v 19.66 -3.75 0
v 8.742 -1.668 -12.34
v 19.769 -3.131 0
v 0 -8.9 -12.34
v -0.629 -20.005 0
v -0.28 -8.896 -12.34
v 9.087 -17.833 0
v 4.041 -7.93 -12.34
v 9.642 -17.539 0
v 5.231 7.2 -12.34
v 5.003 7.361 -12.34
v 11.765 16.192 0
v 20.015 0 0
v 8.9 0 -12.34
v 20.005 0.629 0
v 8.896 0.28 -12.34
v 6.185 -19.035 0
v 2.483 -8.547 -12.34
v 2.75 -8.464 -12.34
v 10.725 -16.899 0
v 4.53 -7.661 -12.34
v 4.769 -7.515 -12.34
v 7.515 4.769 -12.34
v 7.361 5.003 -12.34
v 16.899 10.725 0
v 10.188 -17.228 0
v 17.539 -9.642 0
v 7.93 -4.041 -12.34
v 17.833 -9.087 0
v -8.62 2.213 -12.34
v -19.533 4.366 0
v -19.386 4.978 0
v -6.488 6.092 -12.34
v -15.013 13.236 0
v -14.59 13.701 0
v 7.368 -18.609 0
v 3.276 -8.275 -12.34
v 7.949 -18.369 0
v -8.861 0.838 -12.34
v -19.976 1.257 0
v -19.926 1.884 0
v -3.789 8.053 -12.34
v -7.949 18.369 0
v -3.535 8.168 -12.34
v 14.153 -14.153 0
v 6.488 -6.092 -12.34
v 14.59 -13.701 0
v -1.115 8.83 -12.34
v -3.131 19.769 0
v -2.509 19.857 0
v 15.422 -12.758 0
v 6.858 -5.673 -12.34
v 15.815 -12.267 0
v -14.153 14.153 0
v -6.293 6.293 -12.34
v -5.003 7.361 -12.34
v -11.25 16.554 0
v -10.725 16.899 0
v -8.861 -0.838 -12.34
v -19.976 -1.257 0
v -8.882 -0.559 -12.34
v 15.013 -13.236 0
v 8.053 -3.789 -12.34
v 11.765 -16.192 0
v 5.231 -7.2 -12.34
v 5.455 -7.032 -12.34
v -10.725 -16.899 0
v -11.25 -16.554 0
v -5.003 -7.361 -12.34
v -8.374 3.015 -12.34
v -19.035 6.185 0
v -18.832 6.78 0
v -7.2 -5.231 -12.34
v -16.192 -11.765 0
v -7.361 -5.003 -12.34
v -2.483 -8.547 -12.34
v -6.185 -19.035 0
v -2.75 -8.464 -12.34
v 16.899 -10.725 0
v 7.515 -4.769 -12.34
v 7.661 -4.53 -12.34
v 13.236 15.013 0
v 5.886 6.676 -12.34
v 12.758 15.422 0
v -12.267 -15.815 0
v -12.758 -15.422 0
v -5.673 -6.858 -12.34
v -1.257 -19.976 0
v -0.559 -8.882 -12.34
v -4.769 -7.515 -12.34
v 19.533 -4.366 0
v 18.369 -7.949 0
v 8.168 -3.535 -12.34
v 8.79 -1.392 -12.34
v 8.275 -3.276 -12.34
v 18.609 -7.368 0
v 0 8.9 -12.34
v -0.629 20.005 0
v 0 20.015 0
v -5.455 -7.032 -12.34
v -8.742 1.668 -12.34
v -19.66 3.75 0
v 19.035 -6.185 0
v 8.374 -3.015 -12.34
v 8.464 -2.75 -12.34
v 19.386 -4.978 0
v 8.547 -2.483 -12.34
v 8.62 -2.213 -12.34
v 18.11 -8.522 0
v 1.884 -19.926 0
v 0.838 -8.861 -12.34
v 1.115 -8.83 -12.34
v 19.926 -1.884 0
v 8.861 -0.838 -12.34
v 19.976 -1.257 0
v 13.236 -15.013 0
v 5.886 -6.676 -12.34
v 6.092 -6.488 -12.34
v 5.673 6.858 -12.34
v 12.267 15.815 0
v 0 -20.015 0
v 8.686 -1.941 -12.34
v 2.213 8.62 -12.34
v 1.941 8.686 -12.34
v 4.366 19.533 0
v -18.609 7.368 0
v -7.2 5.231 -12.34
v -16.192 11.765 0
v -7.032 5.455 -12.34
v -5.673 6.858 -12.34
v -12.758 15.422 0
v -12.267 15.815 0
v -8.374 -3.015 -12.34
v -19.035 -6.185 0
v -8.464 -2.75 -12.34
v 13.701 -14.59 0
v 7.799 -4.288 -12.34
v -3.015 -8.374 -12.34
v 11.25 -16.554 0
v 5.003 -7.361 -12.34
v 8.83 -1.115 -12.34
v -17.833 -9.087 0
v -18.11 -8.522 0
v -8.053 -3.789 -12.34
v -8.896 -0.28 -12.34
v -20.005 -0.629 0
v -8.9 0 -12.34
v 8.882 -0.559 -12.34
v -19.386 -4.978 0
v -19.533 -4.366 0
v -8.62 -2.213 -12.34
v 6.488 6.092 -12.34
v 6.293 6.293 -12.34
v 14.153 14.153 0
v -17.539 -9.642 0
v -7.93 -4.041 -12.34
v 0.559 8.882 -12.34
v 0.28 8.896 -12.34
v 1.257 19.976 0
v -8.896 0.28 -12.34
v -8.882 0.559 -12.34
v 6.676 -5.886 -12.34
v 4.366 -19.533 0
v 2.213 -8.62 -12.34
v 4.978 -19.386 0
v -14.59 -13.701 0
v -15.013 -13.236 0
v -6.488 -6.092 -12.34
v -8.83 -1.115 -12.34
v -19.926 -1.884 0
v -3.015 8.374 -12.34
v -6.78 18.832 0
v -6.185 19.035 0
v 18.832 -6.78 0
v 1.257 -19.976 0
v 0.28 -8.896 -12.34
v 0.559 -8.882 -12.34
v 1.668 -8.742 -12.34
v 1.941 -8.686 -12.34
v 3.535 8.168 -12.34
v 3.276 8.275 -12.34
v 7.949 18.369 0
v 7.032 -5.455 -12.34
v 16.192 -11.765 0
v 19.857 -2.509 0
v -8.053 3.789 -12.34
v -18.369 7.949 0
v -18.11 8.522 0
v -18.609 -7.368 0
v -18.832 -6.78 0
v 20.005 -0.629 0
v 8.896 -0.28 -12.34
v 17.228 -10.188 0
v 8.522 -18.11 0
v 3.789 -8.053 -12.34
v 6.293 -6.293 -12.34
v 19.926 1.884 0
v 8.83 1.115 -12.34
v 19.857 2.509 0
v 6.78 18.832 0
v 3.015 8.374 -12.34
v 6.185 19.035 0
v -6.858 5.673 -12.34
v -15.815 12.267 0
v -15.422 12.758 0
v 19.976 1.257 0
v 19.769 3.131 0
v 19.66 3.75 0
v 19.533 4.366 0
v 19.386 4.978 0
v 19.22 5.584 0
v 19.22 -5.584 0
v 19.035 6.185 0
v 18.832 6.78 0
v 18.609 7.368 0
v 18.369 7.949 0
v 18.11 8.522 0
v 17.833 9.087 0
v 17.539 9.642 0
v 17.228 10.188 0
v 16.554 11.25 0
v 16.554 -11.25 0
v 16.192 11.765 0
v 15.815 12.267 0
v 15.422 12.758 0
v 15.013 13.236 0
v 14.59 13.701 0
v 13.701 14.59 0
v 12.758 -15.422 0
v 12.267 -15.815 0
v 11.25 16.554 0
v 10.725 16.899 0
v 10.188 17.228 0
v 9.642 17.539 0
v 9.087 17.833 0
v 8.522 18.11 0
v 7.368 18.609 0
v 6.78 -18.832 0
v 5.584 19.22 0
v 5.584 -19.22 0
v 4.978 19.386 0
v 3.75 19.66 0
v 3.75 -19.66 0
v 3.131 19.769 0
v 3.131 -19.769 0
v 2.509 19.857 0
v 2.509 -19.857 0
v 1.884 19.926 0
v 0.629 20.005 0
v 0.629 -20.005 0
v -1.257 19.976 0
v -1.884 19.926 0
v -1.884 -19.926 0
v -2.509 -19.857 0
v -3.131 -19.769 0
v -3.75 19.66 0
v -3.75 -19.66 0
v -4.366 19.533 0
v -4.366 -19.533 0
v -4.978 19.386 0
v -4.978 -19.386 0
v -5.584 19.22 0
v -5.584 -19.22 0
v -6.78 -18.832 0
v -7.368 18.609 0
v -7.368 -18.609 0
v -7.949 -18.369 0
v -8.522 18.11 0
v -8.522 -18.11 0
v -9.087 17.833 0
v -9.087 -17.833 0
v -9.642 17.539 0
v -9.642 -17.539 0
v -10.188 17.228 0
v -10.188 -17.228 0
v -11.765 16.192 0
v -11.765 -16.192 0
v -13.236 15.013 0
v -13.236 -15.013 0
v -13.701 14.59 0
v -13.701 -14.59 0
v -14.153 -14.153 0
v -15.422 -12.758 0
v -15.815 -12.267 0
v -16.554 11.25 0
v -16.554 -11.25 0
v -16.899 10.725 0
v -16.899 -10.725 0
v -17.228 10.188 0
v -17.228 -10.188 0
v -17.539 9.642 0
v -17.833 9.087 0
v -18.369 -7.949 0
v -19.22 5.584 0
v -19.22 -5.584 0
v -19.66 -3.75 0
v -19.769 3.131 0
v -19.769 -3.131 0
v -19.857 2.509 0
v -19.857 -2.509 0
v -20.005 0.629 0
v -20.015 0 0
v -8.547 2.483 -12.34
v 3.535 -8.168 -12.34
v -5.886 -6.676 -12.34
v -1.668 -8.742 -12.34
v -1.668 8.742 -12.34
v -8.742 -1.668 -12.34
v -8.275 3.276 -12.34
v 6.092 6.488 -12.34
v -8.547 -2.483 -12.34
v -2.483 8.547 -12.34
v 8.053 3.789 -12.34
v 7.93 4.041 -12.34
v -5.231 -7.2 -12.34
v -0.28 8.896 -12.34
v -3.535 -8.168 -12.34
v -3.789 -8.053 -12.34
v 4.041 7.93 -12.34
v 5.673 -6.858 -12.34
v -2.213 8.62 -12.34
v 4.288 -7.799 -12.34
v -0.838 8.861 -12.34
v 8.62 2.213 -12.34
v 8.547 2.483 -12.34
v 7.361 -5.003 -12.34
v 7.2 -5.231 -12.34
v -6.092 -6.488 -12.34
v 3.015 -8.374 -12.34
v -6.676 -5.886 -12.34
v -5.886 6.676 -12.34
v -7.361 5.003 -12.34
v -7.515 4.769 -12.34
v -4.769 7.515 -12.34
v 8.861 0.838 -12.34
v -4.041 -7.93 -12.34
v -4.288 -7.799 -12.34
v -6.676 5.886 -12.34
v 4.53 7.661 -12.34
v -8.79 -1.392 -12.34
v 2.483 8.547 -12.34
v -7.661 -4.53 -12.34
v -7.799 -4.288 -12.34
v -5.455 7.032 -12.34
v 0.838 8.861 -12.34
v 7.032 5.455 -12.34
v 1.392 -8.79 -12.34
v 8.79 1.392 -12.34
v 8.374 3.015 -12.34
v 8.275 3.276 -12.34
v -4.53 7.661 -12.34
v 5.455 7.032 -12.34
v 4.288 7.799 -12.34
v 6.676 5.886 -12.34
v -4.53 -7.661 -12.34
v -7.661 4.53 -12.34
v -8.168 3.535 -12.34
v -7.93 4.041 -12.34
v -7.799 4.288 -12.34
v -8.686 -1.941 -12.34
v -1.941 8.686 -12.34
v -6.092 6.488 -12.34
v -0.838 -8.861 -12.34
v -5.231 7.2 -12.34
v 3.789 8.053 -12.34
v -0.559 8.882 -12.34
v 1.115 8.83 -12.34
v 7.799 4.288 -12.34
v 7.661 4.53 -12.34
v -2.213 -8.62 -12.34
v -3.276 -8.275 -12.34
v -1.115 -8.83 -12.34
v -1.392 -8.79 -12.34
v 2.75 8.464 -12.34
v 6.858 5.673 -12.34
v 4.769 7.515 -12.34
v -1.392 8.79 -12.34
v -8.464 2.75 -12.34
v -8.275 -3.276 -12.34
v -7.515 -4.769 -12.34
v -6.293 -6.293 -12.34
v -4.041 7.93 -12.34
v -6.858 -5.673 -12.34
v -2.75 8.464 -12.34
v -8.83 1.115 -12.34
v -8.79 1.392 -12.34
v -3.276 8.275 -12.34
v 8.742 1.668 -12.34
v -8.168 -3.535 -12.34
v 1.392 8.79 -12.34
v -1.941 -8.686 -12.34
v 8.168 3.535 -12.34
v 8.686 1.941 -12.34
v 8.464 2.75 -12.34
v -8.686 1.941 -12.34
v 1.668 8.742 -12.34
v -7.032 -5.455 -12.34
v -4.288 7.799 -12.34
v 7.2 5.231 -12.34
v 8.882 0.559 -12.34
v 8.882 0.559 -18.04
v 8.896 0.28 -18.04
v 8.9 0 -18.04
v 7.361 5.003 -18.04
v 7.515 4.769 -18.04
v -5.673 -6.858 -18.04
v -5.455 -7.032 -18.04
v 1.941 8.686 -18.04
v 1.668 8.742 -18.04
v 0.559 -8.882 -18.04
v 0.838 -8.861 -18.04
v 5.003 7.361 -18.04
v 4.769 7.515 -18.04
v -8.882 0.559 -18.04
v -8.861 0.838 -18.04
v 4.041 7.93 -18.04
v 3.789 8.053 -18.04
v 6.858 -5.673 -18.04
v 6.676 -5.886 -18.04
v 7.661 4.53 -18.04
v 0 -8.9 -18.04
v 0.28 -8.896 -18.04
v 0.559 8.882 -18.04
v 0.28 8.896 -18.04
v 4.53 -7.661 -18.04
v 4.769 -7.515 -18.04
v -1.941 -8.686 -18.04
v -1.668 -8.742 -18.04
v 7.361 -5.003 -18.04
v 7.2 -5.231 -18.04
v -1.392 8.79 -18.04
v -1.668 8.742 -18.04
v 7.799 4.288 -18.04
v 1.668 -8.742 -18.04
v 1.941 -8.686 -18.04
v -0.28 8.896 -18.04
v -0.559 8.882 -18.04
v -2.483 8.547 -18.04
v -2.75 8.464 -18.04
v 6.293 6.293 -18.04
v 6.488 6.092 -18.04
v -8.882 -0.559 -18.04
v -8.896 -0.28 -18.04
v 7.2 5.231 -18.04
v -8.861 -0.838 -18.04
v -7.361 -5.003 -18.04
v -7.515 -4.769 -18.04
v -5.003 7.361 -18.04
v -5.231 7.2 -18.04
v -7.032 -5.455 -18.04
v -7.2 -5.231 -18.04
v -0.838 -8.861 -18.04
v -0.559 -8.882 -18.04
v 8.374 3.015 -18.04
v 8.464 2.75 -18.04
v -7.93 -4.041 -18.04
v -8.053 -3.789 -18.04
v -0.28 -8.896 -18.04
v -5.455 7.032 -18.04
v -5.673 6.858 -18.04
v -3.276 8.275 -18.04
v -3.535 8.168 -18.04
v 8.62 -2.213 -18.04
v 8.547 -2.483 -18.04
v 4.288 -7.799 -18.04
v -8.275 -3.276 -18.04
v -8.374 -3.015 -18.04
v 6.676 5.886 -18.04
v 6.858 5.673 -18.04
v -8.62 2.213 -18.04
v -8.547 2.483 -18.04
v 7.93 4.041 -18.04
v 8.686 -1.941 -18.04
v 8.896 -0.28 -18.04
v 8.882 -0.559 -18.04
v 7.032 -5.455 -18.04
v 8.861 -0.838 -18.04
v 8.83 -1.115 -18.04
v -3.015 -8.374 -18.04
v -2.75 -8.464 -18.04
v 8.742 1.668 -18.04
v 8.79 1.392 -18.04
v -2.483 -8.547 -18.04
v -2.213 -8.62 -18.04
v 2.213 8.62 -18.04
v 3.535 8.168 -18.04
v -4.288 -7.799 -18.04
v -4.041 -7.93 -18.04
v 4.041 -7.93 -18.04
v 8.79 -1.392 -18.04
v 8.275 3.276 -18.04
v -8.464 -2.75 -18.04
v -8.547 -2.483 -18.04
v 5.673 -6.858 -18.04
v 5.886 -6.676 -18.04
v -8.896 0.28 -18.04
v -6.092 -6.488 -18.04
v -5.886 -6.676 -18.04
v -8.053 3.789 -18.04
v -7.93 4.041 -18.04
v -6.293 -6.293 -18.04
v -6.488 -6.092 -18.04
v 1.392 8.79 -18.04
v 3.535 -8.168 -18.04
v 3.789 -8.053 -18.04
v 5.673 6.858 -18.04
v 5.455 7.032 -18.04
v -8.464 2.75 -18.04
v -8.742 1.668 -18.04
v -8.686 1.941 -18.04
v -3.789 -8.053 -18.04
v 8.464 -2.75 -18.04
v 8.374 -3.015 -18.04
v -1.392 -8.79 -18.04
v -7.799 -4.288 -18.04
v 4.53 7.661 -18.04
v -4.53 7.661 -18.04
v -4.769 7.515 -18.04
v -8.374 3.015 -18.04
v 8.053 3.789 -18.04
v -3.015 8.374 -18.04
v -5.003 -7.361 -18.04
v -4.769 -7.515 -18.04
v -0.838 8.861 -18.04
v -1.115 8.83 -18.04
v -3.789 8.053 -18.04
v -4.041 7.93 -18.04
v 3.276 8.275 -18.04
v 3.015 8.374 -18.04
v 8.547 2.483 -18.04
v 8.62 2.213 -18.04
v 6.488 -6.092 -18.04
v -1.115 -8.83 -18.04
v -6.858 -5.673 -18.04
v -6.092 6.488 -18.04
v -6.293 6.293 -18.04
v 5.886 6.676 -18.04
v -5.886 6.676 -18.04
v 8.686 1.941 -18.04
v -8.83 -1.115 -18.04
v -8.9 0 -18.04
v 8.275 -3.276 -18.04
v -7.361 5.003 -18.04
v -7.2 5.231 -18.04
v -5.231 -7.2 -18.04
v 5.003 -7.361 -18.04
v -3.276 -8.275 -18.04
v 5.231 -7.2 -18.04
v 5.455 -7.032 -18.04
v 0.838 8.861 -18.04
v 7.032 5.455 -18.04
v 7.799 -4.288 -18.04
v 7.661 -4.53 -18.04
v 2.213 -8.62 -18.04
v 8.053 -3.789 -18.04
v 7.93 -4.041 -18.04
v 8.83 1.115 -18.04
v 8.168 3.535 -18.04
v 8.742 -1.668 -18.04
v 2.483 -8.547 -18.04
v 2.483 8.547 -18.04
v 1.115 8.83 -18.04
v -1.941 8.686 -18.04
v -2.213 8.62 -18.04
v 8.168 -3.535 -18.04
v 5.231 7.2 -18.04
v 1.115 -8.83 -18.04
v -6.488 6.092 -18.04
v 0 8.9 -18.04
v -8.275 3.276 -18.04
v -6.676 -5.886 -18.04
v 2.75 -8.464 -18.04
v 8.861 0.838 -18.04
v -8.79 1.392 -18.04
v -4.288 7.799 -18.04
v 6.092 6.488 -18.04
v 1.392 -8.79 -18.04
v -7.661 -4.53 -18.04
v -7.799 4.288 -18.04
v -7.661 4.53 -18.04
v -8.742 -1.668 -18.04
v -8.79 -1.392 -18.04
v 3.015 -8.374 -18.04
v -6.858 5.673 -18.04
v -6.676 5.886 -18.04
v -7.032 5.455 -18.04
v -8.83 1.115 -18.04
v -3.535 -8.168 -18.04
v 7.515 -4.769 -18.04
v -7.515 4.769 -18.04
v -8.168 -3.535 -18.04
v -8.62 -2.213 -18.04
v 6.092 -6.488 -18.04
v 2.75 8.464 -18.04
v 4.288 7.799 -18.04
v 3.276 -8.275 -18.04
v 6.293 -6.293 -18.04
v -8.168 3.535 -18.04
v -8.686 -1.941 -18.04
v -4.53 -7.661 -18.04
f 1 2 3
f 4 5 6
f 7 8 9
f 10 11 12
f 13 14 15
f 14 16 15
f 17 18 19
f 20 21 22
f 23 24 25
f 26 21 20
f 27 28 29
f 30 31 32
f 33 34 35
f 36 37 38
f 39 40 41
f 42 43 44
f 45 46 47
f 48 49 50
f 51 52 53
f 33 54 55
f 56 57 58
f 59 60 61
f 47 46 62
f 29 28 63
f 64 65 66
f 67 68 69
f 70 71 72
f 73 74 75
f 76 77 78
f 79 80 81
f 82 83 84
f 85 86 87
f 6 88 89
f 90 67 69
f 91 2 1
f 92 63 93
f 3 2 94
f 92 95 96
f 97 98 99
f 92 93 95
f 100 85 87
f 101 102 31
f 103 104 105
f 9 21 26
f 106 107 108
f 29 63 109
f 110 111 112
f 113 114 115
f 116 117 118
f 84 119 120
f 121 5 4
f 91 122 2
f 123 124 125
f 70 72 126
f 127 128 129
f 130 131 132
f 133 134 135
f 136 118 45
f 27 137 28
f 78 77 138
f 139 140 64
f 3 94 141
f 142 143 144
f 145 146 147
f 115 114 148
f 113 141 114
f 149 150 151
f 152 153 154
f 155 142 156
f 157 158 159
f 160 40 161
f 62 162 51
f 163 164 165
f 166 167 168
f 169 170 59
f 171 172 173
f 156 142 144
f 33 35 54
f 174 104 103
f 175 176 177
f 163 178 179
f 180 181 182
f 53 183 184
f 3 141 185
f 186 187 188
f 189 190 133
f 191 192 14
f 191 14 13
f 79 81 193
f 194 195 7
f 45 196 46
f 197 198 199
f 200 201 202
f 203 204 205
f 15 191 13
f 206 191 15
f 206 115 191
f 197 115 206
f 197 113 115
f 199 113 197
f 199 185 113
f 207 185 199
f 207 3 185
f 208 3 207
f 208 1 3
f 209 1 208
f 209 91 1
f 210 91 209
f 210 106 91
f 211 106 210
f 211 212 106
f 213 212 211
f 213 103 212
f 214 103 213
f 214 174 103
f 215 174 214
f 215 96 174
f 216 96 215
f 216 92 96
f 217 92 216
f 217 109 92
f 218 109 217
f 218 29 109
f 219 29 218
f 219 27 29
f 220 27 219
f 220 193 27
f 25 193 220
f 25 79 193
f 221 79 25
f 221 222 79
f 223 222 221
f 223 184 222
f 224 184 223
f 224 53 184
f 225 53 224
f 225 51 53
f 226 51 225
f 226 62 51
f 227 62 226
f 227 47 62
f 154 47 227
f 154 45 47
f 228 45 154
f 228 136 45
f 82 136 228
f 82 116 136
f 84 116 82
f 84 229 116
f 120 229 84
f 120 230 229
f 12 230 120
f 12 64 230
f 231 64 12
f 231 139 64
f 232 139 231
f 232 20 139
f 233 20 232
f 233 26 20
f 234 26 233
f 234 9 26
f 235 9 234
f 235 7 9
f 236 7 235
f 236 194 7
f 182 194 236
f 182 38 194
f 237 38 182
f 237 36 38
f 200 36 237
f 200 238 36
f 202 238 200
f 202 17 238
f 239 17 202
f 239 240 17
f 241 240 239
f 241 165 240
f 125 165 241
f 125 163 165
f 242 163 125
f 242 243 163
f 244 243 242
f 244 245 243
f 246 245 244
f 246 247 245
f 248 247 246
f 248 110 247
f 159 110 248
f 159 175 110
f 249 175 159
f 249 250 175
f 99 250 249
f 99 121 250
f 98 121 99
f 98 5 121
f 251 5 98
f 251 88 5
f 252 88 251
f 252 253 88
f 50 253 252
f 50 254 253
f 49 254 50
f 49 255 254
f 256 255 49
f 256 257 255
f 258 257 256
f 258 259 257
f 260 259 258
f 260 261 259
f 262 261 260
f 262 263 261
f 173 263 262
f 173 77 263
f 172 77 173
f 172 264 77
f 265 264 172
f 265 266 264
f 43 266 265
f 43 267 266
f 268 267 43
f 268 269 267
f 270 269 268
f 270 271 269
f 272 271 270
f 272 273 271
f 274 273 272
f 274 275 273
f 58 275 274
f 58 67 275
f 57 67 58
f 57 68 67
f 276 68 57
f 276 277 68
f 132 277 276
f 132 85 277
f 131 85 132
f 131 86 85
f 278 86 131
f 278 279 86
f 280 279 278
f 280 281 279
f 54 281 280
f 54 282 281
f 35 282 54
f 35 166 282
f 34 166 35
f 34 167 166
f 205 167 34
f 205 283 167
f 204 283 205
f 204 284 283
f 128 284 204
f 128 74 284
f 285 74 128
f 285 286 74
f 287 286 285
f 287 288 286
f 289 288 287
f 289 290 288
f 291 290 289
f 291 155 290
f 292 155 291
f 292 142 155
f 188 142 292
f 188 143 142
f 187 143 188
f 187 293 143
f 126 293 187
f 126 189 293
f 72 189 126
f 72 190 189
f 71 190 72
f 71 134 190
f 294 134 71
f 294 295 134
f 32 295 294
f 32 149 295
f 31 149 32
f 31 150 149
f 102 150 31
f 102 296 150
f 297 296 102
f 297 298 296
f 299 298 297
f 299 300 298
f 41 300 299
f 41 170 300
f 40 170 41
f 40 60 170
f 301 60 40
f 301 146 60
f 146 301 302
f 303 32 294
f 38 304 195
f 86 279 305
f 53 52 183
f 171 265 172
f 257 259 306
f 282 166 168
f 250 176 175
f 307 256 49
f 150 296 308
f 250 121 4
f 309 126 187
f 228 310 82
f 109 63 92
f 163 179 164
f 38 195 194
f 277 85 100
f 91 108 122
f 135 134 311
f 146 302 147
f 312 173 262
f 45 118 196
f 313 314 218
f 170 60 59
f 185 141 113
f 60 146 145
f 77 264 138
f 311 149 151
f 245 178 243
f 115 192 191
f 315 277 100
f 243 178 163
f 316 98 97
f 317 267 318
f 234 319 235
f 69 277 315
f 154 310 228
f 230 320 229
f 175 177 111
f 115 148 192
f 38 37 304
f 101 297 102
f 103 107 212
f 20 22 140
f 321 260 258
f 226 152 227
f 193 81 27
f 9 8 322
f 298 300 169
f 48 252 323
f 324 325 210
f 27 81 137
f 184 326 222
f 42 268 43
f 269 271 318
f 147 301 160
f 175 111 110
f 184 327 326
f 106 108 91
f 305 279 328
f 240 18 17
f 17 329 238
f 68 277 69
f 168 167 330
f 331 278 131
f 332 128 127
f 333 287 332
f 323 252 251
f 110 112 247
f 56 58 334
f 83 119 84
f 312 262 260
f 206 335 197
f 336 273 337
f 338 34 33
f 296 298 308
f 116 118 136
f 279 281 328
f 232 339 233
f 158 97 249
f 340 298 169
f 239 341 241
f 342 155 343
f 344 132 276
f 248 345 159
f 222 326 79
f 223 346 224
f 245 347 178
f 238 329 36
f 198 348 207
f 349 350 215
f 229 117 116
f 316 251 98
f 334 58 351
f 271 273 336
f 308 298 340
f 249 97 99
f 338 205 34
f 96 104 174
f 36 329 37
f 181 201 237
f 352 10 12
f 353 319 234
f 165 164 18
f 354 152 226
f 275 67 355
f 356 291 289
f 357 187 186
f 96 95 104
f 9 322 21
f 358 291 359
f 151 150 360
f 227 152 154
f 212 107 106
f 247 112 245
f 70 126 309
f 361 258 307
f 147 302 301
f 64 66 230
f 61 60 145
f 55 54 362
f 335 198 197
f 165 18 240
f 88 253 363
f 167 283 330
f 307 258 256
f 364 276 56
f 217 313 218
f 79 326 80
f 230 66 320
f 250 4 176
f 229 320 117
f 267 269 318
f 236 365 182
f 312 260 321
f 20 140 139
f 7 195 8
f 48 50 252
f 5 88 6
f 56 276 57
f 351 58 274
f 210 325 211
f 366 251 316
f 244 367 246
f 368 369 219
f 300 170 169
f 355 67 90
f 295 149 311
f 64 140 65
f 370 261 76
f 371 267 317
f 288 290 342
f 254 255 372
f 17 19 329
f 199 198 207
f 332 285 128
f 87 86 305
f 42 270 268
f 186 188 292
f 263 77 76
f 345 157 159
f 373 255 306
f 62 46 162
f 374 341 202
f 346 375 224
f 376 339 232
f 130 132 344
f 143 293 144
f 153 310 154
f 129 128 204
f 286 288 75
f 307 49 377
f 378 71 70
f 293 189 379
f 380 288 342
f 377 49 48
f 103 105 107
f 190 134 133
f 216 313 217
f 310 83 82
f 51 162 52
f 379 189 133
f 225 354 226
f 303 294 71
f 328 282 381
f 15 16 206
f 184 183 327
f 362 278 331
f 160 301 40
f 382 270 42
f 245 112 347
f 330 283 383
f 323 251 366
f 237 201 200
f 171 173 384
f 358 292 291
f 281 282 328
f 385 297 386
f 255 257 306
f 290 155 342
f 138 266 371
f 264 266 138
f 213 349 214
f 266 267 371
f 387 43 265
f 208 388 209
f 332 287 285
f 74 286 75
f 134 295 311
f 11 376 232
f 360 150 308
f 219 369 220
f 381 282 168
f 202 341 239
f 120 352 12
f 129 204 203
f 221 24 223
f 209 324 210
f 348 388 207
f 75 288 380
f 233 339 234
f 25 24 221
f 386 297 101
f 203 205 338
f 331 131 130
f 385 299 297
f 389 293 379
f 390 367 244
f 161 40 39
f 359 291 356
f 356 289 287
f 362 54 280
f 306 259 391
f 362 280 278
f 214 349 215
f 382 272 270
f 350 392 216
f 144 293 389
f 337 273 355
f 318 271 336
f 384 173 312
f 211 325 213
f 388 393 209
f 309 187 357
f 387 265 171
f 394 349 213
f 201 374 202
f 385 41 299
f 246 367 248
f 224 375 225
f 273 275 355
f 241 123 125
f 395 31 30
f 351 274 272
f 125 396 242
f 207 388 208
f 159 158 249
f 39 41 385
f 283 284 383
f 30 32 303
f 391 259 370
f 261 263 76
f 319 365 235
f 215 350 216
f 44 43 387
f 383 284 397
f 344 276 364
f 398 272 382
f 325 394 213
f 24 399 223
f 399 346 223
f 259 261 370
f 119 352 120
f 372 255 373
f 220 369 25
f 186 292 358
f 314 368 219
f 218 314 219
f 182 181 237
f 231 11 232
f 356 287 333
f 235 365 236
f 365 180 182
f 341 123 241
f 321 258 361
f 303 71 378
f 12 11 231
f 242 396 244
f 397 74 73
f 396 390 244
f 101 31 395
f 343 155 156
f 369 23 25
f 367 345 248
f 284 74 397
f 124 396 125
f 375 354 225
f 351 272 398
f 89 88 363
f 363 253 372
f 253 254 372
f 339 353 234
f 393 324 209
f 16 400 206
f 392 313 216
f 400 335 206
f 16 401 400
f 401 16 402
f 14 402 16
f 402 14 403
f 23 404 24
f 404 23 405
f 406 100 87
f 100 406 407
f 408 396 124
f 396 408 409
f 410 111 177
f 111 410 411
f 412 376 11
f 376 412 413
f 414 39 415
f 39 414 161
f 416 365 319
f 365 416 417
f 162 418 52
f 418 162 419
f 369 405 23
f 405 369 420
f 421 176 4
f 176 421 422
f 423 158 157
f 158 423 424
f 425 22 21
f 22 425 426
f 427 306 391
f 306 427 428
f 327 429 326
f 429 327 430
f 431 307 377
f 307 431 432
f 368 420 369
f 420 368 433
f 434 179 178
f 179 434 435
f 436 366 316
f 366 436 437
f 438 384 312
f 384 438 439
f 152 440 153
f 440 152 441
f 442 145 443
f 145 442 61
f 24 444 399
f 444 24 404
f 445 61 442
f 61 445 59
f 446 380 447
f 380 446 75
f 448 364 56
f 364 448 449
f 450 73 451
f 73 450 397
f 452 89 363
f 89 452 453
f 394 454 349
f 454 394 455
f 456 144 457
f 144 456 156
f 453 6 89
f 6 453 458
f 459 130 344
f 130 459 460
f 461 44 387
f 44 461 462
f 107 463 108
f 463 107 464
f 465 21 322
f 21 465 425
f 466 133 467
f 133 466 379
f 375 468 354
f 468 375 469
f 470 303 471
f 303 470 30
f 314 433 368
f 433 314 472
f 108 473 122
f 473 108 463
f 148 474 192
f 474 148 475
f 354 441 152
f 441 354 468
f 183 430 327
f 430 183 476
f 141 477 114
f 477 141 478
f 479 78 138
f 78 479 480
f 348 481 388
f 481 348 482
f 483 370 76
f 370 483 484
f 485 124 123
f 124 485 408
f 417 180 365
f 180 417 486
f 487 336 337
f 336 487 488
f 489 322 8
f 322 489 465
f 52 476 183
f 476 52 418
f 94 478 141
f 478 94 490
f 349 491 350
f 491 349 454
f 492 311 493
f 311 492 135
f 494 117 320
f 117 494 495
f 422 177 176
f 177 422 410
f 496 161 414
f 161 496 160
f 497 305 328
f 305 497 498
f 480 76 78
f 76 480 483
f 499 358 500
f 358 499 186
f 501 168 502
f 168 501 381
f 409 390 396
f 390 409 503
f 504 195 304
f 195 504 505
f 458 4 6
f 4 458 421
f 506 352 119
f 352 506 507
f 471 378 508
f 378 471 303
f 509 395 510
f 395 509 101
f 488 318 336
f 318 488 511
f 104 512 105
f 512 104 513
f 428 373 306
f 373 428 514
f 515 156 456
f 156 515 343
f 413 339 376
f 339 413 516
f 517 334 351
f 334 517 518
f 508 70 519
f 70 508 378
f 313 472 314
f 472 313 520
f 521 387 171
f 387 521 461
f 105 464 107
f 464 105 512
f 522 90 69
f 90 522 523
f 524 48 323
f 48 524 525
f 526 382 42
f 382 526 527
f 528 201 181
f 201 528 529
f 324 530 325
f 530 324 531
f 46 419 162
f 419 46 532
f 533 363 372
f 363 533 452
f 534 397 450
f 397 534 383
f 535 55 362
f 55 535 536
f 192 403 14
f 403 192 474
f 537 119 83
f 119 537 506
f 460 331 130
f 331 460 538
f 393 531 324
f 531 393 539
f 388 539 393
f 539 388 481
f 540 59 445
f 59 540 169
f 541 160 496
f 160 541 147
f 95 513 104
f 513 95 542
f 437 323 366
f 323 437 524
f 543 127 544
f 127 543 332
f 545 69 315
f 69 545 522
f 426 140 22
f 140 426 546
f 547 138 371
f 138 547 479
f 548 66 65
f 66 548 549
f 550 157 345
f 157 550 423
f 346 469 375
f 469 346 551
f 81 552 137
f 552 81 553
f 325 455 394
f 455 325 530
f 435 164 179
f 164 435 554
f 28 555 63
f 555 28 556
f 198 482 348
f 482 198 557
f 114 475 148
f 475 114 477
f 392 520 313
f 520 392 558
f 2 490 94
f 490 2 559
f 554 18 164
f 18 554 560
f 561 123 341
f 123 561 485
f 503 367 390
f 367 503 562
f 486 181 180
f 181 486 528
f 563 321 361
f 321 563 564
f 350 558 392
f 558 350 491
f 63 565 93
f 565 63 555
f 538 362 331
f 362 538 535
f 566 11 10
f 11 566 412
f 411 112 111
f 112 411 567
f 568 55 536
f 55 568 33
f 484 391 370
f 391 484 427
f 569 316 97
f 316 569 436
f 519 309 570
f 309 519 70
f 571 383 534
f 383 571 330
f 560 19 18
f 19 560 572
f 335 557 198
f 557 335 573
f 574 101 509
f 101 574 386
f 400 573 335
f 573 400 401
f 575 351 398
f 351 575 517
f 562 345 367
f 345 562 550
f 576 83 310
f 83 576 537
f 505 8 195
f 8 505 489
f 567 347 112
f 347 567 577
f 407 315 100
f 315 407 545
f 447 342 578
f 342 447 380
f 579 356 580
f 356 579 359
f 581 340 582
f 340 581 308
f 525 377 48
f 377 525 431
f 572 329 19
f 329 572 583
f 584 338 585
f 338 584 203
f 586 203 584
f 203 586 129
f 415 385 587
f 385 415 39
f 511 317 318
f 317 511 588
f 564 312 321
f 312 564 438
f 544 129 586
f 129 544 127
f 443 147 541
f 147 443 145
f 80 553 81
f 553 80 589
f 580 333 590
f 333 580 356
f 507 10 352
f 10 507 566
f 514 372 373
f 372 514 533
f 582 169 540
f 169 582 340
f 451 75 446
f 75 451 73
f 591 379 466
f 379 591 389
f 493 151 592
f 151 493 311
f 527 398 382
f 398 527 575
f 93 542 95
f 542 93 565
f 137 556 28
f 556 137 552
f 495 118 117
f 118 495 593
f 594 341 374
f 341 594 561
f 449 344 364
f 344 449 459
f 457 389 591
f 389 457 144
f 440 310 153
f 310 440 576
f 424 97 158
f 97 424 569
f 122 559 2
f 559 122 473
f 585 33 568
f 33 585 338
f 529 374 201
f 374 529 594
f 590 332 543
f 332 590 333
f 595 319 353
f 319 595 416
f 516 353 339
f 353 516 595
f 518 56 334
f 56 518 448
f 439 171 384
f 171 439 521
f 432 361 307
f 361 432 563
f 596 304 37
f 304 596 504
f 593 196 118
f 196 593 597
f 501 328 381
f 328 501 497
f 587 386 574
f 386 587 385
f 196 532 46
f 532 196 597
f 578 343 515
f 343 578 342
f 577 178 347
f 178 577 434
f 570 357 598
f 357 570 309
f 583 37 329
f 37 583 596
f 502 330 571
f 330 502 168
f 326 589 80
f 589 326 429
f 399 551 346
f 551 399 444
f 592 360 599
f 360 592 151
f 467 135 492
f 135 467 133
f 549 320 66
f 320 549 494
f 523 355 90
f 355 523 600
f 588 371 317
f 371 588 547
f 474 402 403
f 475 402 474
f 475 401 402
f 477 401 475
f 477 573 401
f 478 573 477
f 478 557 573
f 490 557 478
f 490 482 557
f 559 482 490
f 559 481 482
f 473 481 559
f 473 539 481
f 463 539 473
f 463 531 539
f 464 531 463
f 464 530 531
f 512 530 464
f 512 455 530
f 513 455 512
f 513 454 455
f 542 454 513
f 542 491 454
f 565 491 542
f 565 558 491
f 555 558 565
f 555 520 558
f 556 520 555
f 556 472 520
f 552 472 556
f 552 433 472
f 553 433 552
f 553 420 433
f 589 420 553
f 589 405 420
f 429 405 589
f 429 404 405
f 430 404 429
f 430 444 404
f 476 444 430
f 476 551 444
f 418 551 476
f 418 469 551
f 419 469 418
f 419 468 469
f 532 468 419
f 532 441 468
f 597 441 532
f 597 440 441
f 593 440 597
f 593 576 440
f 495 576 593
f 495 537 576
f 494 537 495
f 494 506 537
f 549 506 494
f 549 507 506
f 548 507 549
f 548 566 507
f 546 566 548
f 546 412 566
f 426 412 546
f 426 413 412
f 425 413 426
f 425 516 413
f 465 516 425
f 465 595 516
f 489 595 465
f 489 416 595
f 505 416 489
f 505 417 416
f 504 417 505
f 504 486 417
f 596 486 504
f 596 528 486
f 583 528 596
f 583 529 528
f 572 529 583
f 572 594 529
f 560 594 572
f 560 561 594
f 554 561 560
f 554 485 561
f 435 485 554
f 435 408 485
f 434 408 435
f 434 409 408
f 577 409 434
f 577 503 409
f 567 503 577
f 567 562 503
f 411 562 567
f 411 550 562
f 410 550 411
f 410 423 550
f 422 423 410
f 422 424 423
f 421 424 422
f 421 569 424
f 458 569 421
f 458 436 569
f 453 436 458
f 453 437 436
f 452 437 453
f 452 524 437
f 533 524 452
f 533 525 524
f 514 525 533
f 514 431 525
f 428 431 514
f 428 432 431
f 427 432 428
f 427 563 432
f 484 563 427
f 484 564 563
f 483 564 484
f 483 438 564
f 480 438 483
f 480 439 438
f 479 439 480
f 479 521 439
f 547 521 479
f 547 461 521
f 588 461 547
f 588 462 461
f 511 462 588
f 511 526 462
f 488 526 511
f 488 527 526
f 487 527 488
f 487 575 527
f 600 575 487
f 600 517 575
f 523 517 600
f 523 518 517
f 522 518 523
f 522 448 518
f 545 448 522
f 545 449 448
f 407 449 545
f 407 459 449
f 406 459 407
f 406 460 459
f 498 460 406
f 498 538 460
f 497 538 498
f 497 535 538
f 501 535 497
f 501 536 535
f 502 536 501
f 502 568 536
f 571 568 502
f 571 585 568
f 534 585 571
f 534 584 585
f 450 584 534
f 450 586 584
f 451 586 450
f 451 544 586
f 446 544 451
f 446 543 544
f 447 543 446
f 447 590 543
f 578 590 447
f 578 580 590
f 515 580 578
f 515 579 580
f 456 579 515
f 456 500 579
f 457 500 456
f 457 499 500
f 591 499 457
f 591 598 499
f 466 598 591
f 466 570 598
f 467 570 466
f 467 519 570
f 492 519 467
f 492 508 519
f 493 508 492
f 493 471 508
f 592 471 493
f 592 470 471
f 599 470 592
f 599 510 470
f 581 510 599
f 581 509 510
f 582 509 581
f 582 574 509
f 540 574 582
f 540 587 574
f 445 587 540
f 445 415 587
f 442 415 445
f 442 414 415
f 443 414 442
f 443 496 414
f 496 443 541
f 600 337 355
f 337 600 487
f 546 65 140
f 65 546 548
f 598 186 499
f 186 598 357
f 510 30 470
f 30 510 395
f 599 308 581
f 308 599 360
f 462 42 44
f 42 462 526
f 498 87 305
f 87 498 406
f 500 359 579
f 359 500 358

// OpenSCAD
// file: configurations.scad
speaker_asset_main_diameter = 40.03;
speaker_asset_main_z_size = 18.04;
speaker_asset_magnet_diameter = 17.8;
speaker_asset_magnet_z_size = 5.7;
speaker_asset_fn = 200;
// main file
include <configurations.scad>

module speaker40mm(
    speaker_asset_main_diameter = speaker_asset_main_diameter,
    speaker_asset_main_z_size = speaker_asset_main_z_size,
    speaker_asset_magnet_diameter = speaker_asset_magnet_diameter,
    speaker_asset_magnet_z_size = speaker_asset_magnet_z_size,
    speaker_asset_fn = speaker_asset_fn
) {
    color("DimGray")
        union() {
            translate([0, 0, -speaker_asset_main_z_size + speaker_asset_magnet_z_size])
                cylinder(
                    h = speaker_asset_main_z_size - speaker_asset_magnet_z_size,
                    d1 = speaker_asset_magnet_diameter,
                    d2 = speaker_asset_main_diameter,
                    $fn = speaker_asset_fn
                );
            
            translate([0, 0, -speaker_asset_main_z_size])
                cylinder(
                    h = speaker_asset_magnet_z_size,
                    d = speaker_asset_magnet_diameter,
                    $fn = speaker_asset_fn
                );
        }
}


speaker40mm();
